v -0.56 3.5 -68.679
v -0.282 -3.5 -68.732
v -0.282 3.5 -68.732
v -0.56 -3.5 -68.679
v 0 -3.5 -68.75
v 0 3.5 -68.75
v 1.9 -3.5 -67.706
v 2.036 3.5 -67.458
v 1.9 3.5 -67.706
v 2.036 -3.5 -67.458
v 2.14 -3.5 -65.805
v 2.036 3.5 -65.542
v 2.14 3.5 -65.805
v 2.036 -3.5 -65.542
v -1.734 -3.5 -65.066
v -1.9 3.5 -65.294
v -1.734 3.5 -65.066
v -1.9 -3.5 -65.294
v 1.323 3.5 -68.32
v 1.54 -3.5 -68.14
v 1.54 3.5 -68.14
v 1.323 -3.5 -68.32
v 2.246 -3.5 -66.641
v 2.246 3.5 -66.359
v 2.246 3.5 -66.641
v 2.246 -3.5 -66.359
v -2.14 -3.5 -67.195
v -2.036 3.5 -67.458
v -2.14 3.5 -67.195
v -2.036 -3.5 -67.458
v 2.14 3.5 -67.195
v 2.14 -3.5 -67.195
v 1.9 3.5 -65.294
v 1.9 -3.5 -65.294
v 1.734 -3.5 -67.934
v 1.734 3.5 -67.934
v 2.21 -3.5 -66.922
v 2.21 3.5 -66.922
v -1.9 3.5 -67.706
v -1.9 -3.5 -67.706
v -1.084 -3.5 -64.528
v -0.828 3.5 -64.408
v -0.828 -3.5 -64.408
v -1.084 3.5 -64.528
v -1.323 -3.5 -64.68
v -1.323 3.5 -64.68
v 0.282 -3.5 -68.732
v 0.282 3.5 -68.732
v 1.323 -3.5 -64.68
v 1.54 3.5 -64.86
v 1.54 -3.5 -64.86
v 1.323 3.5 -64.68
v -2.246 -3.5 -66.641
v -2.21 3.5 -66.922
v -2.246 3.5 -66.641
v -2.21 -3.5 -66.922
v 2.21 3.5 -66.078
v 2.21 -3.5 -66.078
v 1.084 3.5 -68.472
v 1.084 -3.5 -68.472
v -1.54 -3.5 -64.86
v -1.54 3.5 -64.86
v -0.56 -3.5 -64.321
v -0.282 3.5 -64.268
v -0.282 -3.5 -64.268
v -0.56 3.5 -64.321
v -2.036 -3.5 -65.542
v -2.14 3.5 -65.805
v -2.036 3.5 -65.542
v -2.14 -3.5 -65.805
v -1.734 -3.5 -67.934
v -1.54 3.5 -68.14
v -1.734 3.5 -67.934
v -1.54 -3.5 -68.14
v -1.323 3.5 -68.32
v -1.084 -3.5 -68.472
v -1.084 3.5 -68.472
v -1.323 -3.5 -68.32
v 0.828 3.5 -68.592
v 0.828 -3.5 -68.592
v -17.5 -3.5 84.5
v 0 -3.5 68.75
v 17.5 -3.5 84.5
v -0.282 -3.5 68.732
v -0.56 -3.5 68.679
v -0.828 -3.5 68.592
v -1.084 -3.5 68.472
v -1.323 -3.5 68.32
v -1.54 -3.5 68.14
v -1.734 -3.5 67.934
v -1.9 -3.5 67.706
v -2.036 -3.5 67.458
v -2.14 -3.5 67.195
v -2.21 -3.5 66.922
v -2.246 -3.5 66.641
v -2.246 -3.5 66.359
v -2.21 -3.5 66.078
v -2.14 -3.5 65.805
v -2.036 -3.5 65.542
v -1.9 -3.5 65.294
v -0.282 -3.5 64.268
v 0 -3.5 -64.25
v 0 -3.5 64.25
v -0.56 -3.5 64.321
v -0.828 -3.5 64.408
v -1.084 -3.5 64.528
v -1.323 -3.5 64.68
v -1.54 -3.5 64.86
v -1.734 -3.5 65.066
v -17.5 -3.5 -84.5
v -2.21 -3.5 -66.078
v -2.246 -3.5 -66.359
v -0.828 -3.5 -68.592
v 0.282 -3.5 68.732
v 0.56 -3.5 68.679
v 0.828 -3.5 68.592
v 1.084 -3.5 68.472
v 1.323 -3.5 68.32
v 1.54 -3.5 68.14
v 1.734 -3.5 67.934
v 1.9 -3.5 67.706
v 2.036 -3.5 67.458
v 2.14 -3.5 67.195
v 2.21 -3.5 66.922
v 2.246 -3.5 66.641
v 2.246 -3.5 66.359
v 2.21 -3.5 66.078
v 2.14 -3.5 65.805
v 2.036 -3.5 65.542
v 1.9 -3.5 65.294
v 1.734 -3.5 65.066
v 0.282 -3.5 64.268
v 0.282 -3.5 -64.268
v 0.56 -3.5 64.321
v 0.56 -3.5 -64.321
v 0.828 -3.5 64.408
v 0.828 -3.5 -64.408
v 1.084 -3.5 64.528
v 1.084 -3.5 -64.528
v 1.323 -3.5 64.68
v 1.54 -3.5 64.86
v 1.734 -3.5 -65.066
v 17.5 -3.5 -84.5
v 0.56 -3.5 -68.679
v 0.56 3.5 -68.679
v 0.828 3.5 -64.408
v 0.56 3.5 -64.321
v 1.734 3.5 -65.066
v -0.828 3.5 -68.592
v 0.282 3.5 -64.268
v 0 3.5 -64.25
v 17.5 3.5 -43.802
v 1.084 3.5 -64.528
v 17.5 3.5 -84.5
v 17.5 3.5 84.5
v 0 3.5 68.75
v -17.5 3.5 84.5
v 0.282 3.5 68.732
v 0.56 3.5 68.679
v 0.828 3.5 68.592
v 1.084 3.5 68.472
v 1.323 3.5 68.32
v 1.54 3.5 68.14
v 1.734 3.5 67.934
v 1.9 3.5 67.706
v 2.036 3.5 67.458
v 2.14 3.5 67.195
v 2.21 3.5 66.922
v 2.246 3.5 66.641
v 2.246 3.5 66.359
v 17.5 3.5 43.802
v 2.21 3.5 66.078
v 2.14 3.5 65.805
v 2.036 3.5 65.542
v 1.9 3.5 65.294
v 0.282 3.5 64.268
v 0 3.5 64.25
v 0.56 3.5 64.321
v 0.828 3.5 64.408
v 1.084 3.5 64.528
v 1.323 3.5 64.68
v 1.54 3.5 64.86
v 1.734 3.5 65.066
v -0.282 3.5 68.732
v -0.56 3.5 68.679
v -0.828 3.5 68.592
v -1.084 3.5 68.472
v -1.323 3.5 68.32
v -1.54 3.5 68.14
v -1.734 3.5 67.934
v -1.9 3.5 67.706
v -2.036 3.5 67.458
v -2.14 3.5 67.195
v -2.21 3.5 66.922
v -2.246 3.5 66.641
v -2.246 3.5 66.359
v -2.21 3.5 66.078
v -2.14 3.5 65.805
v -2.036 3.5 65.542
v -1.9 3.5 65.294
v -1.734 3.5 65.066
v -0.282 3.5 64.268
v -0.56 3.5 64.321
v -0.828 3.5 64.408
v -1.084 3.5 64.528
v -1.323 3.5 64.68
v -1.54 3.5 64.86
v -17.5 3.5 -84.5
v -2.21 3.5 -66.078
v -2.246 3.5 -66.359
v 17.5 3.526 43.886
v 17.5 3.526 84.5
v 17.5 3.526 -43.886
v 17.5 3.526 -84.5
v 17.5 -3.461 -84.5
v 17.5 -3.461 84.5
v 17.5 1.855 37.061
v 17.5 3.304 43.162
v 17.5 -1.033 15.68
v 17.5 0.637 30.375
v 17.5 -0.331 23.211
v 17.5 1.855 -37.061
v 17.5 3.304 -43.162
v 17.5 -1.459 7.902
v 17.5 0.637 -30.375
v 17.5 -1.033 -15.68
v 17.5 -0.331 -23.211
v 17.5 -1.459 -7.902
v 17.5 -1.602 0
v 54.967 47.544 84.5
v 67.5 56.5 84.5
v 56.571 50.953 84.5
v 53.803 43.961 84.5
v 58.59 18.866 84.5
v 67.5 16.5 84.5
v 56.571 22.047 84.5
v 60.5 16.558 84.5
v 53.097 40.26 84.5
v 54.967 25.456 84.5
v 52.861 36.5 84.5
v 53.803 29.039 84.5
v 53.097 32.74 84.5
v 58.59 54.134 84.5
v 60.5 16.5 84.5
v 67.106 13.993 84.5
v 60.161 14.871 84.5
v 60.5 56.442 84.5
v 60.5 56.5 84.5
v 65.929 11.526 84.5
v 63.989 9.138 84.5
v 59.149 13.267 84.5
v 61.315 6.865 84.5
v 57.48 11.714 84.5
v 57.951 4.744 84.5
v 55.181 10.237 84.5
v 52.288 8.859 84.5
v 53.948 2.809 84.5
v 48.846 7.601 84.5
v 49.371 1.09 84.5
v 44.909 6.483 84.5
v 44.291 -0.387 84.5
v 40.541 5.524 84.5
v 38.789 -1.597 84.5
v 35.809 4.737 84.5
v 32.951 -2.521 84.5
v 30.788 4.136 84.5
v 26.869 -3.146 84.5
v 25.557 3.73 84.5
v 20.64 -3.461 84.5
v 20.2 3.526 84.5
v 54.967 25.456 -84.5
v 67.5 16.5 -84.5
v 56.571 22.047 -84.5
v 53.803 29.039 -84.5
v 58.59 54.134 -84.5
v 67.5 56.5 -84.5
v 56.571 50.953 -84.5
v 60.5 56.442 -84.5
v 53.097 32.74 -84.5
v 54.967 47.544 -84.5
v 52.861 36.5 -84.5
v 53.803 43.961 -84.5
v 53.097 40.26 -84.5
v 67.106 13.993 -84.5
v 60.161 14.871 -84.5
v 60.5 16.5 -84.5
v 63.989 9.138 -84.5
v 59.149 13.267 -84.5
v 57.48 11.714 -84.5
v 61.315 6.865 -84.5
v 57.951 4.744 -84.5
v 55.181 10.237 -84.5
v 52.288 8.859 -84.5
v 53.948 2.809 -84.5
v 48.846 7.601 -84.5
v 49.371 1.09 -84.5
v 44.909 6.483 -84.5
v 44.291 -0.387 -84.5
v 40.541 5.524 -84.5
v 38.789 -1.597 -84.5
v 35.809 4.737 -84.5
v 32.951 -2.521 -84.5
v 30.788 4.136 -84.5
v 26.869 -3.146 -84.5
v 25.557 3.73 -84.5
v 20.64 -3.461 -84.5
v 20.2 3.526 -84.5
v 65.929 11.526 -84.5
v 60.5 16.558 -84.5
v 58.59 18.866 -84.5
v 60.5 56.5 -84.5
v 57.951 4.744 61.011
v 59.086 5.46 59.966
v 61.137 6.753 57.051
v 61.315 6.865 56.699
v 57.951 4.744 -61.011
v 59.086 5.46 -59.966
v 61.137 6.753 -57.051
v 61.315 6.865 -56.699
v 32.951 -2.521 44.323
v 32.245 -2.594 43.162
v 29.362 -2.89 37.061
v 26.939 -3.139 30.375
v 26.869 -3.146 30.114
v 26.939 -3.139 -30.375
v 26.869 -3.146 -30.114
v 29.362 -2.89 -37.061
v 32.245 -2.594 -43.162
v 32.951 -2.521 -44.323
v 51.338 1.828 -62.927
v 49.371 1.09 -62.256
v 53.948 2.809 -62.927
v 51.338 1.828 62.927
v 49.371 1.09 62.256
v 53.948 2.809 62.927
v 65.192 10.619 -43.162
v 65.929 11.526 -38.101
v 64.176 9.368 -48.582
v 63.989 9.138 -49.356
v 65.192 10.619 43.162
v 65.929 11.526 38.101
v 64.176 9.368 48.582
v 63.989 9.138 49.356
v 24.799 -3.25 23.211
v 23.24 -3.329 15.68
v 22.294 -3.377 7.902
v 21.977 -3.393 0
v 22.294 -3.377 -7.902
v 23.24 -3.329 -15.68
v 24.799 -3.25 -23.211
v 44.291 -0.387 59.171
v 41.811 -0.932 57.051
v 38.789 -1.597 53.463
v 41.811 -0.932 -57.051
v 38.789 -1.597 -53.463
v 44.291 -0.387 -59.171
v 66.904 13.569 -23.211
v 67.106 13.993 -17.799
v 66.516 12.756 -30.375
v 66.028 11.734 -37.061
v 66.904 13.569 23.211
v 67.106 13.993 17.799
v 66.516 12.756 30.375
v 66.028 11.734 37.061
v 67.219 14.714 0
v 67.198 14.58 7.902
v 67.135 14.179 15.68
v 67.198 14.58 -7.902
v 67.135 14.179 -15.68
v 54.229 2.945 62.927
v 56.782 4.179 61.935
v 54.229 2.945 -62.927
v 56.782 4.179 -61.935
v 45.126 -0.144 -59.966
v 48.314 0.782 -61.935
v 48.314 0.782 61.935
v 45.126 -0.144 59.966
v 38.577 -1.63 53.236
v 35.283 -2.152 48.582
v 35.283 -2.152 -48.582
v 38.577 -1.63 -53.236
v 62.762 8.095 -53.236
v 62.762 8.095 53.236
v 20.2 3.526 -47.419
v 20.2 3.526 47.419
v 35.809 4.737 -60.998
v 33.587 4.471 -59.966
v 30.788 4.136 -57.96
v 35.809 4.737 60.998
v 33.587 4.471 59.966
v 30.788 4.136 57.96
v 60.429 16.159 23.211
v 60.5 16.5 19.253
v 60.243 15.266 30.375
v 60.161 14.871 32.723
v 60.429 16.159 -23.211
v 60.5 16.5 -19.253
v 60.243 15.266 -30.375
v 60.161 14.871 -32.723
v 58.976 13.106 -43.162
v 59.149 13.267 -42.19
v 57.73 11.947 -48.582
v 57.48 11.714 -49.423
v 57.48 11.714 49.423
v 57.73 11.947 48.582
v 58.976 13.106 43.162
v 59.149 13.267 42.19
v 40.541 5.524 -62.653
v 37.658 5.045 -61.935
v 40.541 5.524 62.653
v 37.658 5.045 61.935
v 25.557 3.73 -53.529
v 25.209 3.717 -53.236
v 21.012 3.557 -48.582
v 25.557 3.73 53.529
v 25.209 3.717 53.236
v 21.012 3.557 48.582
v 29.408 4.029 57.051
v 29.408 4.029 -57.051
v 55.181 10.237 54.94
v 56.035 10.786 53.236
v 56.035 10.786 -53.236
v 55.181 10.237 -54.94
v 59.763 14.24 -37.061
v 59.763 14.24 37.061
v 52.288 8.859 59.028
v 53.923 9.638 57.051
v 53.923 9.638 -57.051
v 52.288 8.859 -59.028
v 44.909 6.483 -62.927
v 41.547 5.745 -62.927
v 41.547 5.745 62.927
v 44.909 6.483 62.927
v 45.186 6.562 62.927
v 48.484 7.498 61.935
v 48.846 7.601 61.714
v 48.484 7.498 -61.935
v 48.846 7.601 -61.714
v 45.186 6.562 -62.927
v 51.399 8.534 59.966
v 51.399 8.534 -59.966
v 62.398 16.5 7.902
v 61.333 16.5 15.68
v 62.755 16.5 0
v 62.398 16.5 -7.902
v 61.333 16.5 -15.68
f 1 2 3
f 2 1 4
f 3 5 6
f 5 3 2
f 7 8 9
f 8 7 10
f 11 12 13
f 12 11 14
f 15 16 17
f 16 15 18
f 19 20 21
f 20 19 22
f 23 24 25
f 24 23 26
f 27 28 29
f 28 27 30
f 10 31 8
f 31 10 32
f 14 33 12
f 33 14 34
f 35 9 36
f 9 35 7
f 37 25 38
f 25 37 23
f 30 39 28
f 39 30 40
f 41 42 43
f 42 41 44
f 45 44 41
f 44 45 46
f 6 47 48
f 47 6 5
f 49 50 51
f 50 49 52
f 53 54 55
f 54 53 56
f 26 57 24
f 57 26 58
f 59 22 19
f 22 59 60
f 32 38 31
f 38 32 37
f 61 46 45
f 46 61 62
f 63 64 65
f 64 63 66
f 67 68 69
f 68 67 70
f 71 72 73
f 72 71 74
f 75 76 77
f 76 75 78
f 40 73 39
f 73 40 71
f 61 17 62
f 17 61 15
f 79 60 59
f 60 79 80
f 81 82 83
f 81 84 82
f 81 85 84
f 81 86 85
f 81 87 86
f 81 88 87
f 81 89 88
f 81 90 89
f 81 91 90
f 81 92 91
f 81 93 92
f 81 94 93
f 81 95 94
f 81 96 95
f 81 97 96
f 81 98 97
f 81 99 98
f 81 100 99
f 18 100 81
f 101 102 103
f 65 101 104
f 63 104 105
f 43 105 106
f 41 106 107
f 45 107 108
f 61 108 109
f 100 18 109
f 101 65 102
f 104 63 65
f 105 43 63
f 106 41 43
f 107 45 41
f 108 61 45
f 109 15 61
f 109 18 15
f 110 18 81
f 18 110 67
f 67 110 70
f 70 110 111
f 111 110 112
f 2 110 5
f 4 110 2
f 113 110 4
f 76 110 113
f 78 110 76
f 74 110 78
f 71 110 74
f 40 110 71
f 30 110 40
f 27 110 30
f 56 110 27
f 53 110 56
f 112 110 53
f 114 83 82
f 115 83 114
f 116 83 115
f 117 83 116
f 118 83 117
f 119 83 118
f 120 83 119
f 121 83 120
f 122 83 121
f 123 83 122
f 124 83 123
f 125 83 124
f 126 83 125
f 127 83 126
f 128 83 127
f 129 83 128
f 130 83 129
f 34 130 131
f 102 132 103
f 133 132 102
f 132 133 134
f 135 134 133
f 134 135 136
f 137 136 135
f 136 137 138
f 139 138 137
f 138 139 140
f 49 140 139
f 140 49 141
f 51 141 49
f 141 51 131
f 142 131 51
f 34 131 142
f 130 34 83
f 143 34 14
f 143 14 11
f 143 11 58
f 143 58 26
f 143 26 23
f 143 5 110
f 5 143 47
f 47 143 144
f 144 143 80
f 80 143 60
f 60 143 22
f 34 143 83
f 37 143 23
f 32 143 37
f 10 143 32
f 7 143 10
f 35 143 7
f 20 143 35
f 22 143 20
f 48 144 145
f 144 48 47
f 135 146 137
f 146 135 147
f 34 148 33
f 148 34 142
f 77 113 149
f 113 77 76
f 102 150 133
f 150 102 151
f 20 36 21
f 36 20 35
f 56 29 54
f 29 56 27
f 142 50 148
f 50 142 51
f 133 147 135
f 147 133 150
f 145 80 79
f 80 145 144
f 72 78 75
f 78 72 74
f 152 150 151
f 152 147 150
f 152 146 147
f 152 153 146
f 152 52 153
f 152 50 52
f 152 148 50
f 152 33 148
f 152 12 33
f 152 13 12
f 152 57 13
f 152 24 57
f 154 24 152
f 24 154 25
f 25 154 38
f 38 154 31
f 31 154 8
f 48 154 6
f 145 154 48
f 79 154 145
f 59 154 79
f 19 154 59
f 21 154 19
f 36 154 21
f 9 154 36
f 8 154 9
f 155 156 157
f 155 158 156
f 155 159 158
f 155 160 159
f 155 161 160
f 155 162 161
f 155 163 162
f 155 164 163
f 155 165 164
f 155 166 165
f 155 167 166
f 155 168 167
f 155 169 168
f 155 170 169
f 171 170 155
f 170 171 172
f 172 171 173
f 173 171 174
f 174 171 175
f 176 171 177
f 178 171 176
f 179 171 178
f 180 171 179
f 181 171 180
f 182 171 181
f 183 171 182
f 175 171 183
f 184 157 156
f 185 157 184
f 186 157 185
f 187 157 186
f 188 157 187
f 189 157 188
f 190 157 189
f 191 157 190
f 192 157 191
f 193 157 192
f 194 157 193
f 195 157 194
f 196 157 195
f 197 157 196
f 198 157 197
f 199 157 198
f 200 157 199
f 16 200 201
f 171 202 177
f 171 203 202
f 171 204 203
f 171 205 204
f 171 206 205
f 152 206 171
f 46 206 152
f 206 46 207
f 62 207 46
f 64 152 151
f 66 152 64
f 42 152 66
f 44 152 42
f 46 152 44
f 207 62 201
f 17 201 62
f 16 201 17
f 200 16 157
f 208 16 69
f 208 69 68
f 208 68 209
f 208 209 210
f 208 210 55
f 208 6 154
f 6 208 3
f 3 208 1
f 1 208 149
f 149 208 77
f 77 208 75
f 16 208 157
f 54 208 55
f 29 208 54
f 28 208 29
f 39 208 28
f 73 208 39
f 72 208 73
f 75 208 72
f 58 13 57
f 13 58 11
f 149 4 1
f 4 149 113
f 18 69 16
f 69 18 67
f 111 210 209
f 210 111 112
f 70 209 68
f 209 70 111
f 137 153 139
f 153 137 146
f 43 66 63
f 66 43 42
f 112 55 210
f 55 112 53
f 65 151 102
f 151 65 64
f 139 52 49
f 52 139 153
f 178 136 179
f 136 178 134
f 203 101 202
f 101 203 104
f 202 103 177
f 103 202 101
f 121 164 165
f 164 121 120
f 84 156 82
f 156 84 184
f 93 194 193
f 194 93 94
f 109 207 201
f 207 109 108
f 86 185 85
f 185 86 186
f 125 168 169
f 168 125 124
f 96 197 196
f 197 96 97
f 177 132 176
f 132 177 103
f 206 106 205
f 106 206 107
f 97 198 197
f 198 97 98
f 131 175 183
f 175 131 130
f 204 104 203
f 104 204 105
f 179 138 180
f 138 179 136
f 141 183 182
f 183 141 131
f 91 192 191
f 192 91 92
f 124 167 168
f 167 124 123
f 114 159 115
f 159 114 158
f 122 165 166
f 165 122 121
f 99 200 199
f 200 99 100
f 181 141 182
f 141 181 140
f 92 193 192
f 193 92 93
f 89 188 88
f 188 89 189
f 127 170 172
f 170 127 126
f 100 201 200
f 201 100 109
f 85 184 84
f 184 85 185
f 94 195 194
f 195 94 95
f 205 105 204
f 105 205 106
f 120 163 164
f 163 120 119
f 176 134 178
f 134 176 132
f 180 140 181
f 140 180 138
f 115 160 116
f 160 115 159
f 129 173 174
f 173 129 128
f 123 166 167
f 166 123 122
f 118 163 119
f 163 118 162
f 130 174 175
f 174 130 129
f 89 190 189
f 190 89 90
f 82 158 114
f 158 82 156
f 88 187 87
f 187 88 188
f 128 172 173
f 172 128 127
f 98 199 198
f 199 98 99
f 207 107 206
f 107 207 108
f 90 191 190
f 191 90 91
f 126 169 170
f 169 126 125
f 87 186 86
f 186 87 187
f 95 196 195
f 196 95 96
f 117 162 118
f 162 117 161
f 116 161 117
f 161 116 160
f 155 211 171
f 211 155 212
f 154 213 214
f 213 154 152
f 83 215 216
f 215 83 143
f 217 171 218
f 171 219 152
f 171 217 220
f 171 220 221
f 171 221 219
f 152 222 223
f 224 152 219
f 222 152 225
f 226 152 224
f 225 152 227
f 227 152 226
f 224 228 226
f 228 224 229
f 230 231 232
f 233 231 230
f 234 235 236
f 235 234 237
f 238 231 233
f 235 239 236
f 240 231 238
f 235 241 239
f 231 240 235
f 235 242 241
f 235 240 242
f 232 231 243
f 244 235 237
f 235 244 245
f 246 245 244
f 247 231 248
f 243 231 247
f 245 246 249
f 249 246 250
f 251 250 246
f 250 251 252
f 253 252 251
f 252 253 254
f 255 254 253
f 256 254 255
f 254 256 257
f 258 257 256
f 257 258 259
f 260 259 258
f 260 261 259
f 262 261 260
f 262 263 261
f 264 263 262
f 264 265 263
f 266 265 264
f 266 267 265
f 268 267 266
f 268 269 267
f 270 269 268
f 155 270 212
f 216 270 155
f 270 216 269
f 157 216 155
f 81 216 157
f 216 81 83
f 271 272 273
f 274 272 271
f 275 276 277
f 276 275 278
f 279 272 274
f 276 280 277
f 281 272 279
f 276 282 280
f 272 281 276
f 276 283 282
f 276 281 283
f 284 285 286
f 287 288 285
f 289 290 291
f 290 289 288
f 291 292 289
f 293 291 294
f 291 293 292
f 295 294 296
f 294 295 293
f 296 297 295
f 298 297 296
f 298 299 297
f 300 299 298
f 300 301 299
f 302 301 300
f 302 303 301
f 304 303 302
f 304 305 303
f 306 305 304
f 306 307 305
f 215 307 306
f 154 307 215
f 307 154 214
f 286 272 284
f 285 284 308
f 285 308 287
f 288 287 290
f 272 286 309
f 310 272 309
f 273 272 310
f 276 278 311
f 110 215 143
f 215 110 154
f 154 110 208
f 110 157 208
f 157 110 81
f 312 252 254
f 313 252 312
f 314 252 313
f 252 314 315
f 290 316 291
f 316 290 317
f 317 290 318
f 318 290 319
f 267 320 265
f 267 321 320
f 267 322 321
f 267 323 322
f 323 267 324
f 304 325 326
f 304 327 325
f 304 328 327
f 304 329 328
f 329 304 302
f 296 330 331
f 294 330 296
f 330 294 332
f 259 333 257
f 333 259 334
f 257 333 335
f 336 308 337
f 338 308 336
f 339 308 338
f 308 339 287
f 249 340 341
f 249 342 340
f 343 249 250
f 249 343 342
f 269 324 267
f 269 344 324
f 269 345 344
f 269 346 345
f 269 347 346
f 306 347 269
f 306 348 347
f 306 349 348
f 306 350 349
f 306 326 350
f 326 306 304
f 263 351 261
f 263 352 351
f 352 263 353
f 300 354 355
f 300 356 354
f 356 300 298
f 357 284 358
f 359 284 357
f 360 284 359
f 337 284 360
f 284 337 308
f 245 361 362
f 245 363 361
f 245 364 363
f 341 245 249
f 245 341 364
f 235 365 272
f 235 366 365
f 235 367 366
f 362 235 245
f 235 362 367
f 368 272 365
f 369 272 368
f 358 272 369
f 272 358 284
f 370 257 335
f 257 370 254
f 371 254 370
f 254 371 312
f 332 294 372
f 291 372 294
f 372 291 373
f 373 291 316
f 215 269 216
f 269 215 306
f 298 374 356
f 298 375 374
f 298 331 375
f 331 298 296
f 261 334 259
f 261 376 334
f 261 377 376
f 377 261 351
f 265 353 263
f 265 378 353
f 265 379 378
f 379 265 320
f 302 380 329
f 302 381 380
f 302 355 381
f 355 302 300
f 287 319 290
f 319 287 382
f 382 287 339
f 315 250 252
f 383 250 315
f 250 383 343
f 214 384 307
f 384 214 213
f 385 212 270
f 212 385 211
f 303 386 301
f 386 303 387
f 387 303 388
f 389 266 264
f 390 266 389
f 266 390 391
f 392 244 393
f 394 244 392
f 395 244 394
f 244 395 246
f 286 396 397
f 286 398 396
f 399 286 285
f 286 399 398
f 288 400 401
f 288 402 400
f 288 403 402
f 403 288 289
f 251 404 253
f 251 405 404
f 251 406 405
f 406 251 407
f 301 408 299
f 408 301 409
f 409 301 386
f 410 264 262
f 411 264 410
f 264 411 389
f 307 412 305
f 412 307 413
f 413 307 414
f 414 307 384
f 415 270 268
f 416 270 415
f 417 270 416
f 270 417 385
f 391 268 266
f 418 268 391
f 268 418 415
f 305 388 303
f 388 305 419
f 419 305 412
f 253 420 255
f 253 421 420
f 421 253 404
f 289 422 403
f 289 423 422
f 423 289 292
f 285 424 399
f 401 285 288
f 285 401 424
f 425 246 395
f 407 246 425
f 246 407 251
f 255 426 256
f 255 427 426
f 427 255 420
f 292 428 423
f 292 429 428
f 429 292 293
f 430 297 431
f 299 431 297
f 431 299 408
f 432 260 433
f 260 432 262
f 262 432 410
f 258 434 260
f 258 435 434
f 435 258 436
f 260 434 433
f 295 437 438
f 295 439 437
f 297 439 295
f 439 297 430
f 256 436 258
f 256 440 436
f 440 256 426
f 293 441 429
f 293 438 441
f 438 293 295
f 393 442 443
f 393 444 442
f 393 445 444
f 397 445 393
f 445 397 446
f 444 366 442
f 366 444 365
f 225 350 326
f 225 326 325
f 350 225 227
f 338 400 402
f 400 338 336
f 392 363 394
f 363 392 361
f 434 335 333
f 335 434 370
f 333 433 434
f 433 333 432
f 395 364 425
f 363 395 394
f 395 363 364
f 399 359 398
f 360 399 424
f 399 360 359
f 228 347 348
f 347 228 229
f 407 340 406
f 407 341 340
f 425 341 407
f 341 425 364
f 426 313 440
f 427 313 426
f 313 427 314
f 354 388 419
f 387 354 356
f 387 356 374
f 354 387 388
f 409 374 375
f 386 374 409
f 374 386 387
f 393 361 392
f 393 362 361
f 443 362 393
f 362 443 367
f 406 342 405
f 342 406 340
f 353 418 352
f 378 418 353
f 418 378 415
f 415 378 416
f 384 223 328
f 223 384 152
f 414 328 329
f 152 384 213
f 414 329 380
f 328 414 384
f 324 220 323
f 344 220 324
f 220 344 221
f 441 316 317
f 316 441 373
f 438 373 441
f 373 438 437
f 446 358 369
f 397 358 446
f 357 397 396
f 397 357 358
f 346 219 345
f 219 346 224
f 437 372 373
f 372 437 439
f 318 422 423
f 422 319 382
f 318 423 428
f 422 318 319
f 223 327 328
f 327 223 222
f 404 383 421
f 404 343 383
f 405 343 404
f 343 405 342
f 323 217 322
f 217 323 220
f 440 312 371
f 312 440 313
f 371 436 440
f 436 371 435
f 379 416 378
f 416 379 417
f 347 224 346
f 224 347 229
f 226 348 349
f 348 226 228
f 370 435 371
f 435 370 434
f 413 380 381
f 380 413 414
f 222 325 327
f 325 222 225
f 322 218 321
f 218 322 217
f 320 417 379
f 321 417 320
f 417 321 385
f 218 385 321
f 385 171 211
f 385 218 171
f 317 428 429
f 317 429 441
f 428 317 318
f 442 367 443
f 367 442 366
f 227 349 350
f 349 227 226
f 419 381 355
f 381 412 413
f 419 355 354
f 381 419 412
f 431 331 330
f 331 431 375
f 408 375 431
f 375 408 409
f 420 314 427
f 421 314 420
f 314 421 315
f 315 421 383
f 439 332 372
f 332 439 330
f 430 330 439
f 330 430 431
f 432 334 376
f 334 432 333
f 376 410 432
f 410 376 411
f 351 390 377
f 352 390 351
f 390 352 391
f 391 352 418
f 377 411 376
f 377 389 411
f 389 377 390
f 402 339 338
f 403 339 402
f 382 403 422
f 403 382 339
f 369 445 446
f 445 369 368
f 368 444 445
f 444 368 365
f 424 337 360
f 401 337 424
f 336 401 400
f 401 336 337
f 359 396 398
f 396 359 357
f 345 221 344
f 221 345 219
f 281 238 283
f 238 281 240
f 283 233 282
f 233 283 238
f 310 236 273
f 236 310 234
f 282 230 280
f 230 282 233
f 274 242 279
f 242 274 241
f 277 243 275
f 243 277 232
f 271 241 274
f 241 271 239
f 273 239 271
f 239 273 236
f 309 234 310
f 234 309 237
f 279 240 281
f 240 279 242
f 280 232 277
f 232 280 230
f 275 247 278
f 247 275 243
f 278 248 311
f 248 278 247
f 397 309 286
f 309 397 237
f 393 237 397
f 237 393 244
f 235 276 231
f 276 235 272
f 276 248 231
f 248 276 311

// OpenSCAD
/*
 * FRIDGE HANDLER
 *
 * A piece I made when the handler of my fridge broke and I had to make it again.
 *
 * Made by SERGIO MIGUÉNS IGLESIAS <sergio@lony.xyz> for personal use, 2023.
 */

$fn = 50;  // Resolution for circles.

M = 4.5;   // Size of the screws (diameter, add 0.5mm just in case).
S = 133;   // Separation between the screws (add 1mm just in case).

W = 35;    // Width of the piece.
H = S+M*8; // Total height of the piece. Leave it like this.
D = 7;     // Depth of the piece.

R = 20;    // Radius for the union piece.
T = 2.5;   // Multiplier for the union piece to make it an oval.

HW = 40;   // Width of the handle.

// Square piece that first into the fridge with the two screws.
difference() {
  cube([W, D, H], center = true);
  for (i = [-1, 1])
    translate([0, 0, i*S/2])
      rotate([0, 90, 90])
        cylinder(D, M/2, M/2, center = true);
}

// Bridge between pieces with a hole so that you can grab it.
translate([W/2, R - D/2]) {
  scale([T, 1]) {
    difference() {
      cylinder(H, R, R, center = true);
      scale([(T*R - D)/(R - D)/T, 1])
        cylinder(H, R - D, R - D, center = true);
      translate([-R/2, 0])
        cube([R, R*2, H], center = true);
      translate([0, R/2])
        cube([R*2, R, H], center = true);
      // TODO That 8*M is there because it makes the center hole have two
      //      thicker bridges on top and bottom. Read below because this is in
      //      the same situation.
      scale([1, 1, (H - 8*M)/(R + D)])
        rotate([90, 0, 45])
          // TODO See that 0.4? It adjusts the size of the whole so it fits the
          //      piece better. I don't know how to parametrize this so like
	  //      this it stays.
          cylinder(H, R/2 + 0.4*D, R/2 + 0.4*D, center = true);
    }
  }
}

// Handler with rounded edge to be comfortable.
translate([W/2 + T*R - D/2, HW/2 + R - D/2]) {
  cube([D, HW, H], center = true);
  r = 0.75*HW;
  desp = sqrt(r*r - HW*HW/4);
  intersection() {
    translate([desp - D/2, 0])
      cylinder(H, r, r, center = true);
    translate([-HW/2 - D/2, 0])
      cube([HW, HW, H], center = true);
  }
}
